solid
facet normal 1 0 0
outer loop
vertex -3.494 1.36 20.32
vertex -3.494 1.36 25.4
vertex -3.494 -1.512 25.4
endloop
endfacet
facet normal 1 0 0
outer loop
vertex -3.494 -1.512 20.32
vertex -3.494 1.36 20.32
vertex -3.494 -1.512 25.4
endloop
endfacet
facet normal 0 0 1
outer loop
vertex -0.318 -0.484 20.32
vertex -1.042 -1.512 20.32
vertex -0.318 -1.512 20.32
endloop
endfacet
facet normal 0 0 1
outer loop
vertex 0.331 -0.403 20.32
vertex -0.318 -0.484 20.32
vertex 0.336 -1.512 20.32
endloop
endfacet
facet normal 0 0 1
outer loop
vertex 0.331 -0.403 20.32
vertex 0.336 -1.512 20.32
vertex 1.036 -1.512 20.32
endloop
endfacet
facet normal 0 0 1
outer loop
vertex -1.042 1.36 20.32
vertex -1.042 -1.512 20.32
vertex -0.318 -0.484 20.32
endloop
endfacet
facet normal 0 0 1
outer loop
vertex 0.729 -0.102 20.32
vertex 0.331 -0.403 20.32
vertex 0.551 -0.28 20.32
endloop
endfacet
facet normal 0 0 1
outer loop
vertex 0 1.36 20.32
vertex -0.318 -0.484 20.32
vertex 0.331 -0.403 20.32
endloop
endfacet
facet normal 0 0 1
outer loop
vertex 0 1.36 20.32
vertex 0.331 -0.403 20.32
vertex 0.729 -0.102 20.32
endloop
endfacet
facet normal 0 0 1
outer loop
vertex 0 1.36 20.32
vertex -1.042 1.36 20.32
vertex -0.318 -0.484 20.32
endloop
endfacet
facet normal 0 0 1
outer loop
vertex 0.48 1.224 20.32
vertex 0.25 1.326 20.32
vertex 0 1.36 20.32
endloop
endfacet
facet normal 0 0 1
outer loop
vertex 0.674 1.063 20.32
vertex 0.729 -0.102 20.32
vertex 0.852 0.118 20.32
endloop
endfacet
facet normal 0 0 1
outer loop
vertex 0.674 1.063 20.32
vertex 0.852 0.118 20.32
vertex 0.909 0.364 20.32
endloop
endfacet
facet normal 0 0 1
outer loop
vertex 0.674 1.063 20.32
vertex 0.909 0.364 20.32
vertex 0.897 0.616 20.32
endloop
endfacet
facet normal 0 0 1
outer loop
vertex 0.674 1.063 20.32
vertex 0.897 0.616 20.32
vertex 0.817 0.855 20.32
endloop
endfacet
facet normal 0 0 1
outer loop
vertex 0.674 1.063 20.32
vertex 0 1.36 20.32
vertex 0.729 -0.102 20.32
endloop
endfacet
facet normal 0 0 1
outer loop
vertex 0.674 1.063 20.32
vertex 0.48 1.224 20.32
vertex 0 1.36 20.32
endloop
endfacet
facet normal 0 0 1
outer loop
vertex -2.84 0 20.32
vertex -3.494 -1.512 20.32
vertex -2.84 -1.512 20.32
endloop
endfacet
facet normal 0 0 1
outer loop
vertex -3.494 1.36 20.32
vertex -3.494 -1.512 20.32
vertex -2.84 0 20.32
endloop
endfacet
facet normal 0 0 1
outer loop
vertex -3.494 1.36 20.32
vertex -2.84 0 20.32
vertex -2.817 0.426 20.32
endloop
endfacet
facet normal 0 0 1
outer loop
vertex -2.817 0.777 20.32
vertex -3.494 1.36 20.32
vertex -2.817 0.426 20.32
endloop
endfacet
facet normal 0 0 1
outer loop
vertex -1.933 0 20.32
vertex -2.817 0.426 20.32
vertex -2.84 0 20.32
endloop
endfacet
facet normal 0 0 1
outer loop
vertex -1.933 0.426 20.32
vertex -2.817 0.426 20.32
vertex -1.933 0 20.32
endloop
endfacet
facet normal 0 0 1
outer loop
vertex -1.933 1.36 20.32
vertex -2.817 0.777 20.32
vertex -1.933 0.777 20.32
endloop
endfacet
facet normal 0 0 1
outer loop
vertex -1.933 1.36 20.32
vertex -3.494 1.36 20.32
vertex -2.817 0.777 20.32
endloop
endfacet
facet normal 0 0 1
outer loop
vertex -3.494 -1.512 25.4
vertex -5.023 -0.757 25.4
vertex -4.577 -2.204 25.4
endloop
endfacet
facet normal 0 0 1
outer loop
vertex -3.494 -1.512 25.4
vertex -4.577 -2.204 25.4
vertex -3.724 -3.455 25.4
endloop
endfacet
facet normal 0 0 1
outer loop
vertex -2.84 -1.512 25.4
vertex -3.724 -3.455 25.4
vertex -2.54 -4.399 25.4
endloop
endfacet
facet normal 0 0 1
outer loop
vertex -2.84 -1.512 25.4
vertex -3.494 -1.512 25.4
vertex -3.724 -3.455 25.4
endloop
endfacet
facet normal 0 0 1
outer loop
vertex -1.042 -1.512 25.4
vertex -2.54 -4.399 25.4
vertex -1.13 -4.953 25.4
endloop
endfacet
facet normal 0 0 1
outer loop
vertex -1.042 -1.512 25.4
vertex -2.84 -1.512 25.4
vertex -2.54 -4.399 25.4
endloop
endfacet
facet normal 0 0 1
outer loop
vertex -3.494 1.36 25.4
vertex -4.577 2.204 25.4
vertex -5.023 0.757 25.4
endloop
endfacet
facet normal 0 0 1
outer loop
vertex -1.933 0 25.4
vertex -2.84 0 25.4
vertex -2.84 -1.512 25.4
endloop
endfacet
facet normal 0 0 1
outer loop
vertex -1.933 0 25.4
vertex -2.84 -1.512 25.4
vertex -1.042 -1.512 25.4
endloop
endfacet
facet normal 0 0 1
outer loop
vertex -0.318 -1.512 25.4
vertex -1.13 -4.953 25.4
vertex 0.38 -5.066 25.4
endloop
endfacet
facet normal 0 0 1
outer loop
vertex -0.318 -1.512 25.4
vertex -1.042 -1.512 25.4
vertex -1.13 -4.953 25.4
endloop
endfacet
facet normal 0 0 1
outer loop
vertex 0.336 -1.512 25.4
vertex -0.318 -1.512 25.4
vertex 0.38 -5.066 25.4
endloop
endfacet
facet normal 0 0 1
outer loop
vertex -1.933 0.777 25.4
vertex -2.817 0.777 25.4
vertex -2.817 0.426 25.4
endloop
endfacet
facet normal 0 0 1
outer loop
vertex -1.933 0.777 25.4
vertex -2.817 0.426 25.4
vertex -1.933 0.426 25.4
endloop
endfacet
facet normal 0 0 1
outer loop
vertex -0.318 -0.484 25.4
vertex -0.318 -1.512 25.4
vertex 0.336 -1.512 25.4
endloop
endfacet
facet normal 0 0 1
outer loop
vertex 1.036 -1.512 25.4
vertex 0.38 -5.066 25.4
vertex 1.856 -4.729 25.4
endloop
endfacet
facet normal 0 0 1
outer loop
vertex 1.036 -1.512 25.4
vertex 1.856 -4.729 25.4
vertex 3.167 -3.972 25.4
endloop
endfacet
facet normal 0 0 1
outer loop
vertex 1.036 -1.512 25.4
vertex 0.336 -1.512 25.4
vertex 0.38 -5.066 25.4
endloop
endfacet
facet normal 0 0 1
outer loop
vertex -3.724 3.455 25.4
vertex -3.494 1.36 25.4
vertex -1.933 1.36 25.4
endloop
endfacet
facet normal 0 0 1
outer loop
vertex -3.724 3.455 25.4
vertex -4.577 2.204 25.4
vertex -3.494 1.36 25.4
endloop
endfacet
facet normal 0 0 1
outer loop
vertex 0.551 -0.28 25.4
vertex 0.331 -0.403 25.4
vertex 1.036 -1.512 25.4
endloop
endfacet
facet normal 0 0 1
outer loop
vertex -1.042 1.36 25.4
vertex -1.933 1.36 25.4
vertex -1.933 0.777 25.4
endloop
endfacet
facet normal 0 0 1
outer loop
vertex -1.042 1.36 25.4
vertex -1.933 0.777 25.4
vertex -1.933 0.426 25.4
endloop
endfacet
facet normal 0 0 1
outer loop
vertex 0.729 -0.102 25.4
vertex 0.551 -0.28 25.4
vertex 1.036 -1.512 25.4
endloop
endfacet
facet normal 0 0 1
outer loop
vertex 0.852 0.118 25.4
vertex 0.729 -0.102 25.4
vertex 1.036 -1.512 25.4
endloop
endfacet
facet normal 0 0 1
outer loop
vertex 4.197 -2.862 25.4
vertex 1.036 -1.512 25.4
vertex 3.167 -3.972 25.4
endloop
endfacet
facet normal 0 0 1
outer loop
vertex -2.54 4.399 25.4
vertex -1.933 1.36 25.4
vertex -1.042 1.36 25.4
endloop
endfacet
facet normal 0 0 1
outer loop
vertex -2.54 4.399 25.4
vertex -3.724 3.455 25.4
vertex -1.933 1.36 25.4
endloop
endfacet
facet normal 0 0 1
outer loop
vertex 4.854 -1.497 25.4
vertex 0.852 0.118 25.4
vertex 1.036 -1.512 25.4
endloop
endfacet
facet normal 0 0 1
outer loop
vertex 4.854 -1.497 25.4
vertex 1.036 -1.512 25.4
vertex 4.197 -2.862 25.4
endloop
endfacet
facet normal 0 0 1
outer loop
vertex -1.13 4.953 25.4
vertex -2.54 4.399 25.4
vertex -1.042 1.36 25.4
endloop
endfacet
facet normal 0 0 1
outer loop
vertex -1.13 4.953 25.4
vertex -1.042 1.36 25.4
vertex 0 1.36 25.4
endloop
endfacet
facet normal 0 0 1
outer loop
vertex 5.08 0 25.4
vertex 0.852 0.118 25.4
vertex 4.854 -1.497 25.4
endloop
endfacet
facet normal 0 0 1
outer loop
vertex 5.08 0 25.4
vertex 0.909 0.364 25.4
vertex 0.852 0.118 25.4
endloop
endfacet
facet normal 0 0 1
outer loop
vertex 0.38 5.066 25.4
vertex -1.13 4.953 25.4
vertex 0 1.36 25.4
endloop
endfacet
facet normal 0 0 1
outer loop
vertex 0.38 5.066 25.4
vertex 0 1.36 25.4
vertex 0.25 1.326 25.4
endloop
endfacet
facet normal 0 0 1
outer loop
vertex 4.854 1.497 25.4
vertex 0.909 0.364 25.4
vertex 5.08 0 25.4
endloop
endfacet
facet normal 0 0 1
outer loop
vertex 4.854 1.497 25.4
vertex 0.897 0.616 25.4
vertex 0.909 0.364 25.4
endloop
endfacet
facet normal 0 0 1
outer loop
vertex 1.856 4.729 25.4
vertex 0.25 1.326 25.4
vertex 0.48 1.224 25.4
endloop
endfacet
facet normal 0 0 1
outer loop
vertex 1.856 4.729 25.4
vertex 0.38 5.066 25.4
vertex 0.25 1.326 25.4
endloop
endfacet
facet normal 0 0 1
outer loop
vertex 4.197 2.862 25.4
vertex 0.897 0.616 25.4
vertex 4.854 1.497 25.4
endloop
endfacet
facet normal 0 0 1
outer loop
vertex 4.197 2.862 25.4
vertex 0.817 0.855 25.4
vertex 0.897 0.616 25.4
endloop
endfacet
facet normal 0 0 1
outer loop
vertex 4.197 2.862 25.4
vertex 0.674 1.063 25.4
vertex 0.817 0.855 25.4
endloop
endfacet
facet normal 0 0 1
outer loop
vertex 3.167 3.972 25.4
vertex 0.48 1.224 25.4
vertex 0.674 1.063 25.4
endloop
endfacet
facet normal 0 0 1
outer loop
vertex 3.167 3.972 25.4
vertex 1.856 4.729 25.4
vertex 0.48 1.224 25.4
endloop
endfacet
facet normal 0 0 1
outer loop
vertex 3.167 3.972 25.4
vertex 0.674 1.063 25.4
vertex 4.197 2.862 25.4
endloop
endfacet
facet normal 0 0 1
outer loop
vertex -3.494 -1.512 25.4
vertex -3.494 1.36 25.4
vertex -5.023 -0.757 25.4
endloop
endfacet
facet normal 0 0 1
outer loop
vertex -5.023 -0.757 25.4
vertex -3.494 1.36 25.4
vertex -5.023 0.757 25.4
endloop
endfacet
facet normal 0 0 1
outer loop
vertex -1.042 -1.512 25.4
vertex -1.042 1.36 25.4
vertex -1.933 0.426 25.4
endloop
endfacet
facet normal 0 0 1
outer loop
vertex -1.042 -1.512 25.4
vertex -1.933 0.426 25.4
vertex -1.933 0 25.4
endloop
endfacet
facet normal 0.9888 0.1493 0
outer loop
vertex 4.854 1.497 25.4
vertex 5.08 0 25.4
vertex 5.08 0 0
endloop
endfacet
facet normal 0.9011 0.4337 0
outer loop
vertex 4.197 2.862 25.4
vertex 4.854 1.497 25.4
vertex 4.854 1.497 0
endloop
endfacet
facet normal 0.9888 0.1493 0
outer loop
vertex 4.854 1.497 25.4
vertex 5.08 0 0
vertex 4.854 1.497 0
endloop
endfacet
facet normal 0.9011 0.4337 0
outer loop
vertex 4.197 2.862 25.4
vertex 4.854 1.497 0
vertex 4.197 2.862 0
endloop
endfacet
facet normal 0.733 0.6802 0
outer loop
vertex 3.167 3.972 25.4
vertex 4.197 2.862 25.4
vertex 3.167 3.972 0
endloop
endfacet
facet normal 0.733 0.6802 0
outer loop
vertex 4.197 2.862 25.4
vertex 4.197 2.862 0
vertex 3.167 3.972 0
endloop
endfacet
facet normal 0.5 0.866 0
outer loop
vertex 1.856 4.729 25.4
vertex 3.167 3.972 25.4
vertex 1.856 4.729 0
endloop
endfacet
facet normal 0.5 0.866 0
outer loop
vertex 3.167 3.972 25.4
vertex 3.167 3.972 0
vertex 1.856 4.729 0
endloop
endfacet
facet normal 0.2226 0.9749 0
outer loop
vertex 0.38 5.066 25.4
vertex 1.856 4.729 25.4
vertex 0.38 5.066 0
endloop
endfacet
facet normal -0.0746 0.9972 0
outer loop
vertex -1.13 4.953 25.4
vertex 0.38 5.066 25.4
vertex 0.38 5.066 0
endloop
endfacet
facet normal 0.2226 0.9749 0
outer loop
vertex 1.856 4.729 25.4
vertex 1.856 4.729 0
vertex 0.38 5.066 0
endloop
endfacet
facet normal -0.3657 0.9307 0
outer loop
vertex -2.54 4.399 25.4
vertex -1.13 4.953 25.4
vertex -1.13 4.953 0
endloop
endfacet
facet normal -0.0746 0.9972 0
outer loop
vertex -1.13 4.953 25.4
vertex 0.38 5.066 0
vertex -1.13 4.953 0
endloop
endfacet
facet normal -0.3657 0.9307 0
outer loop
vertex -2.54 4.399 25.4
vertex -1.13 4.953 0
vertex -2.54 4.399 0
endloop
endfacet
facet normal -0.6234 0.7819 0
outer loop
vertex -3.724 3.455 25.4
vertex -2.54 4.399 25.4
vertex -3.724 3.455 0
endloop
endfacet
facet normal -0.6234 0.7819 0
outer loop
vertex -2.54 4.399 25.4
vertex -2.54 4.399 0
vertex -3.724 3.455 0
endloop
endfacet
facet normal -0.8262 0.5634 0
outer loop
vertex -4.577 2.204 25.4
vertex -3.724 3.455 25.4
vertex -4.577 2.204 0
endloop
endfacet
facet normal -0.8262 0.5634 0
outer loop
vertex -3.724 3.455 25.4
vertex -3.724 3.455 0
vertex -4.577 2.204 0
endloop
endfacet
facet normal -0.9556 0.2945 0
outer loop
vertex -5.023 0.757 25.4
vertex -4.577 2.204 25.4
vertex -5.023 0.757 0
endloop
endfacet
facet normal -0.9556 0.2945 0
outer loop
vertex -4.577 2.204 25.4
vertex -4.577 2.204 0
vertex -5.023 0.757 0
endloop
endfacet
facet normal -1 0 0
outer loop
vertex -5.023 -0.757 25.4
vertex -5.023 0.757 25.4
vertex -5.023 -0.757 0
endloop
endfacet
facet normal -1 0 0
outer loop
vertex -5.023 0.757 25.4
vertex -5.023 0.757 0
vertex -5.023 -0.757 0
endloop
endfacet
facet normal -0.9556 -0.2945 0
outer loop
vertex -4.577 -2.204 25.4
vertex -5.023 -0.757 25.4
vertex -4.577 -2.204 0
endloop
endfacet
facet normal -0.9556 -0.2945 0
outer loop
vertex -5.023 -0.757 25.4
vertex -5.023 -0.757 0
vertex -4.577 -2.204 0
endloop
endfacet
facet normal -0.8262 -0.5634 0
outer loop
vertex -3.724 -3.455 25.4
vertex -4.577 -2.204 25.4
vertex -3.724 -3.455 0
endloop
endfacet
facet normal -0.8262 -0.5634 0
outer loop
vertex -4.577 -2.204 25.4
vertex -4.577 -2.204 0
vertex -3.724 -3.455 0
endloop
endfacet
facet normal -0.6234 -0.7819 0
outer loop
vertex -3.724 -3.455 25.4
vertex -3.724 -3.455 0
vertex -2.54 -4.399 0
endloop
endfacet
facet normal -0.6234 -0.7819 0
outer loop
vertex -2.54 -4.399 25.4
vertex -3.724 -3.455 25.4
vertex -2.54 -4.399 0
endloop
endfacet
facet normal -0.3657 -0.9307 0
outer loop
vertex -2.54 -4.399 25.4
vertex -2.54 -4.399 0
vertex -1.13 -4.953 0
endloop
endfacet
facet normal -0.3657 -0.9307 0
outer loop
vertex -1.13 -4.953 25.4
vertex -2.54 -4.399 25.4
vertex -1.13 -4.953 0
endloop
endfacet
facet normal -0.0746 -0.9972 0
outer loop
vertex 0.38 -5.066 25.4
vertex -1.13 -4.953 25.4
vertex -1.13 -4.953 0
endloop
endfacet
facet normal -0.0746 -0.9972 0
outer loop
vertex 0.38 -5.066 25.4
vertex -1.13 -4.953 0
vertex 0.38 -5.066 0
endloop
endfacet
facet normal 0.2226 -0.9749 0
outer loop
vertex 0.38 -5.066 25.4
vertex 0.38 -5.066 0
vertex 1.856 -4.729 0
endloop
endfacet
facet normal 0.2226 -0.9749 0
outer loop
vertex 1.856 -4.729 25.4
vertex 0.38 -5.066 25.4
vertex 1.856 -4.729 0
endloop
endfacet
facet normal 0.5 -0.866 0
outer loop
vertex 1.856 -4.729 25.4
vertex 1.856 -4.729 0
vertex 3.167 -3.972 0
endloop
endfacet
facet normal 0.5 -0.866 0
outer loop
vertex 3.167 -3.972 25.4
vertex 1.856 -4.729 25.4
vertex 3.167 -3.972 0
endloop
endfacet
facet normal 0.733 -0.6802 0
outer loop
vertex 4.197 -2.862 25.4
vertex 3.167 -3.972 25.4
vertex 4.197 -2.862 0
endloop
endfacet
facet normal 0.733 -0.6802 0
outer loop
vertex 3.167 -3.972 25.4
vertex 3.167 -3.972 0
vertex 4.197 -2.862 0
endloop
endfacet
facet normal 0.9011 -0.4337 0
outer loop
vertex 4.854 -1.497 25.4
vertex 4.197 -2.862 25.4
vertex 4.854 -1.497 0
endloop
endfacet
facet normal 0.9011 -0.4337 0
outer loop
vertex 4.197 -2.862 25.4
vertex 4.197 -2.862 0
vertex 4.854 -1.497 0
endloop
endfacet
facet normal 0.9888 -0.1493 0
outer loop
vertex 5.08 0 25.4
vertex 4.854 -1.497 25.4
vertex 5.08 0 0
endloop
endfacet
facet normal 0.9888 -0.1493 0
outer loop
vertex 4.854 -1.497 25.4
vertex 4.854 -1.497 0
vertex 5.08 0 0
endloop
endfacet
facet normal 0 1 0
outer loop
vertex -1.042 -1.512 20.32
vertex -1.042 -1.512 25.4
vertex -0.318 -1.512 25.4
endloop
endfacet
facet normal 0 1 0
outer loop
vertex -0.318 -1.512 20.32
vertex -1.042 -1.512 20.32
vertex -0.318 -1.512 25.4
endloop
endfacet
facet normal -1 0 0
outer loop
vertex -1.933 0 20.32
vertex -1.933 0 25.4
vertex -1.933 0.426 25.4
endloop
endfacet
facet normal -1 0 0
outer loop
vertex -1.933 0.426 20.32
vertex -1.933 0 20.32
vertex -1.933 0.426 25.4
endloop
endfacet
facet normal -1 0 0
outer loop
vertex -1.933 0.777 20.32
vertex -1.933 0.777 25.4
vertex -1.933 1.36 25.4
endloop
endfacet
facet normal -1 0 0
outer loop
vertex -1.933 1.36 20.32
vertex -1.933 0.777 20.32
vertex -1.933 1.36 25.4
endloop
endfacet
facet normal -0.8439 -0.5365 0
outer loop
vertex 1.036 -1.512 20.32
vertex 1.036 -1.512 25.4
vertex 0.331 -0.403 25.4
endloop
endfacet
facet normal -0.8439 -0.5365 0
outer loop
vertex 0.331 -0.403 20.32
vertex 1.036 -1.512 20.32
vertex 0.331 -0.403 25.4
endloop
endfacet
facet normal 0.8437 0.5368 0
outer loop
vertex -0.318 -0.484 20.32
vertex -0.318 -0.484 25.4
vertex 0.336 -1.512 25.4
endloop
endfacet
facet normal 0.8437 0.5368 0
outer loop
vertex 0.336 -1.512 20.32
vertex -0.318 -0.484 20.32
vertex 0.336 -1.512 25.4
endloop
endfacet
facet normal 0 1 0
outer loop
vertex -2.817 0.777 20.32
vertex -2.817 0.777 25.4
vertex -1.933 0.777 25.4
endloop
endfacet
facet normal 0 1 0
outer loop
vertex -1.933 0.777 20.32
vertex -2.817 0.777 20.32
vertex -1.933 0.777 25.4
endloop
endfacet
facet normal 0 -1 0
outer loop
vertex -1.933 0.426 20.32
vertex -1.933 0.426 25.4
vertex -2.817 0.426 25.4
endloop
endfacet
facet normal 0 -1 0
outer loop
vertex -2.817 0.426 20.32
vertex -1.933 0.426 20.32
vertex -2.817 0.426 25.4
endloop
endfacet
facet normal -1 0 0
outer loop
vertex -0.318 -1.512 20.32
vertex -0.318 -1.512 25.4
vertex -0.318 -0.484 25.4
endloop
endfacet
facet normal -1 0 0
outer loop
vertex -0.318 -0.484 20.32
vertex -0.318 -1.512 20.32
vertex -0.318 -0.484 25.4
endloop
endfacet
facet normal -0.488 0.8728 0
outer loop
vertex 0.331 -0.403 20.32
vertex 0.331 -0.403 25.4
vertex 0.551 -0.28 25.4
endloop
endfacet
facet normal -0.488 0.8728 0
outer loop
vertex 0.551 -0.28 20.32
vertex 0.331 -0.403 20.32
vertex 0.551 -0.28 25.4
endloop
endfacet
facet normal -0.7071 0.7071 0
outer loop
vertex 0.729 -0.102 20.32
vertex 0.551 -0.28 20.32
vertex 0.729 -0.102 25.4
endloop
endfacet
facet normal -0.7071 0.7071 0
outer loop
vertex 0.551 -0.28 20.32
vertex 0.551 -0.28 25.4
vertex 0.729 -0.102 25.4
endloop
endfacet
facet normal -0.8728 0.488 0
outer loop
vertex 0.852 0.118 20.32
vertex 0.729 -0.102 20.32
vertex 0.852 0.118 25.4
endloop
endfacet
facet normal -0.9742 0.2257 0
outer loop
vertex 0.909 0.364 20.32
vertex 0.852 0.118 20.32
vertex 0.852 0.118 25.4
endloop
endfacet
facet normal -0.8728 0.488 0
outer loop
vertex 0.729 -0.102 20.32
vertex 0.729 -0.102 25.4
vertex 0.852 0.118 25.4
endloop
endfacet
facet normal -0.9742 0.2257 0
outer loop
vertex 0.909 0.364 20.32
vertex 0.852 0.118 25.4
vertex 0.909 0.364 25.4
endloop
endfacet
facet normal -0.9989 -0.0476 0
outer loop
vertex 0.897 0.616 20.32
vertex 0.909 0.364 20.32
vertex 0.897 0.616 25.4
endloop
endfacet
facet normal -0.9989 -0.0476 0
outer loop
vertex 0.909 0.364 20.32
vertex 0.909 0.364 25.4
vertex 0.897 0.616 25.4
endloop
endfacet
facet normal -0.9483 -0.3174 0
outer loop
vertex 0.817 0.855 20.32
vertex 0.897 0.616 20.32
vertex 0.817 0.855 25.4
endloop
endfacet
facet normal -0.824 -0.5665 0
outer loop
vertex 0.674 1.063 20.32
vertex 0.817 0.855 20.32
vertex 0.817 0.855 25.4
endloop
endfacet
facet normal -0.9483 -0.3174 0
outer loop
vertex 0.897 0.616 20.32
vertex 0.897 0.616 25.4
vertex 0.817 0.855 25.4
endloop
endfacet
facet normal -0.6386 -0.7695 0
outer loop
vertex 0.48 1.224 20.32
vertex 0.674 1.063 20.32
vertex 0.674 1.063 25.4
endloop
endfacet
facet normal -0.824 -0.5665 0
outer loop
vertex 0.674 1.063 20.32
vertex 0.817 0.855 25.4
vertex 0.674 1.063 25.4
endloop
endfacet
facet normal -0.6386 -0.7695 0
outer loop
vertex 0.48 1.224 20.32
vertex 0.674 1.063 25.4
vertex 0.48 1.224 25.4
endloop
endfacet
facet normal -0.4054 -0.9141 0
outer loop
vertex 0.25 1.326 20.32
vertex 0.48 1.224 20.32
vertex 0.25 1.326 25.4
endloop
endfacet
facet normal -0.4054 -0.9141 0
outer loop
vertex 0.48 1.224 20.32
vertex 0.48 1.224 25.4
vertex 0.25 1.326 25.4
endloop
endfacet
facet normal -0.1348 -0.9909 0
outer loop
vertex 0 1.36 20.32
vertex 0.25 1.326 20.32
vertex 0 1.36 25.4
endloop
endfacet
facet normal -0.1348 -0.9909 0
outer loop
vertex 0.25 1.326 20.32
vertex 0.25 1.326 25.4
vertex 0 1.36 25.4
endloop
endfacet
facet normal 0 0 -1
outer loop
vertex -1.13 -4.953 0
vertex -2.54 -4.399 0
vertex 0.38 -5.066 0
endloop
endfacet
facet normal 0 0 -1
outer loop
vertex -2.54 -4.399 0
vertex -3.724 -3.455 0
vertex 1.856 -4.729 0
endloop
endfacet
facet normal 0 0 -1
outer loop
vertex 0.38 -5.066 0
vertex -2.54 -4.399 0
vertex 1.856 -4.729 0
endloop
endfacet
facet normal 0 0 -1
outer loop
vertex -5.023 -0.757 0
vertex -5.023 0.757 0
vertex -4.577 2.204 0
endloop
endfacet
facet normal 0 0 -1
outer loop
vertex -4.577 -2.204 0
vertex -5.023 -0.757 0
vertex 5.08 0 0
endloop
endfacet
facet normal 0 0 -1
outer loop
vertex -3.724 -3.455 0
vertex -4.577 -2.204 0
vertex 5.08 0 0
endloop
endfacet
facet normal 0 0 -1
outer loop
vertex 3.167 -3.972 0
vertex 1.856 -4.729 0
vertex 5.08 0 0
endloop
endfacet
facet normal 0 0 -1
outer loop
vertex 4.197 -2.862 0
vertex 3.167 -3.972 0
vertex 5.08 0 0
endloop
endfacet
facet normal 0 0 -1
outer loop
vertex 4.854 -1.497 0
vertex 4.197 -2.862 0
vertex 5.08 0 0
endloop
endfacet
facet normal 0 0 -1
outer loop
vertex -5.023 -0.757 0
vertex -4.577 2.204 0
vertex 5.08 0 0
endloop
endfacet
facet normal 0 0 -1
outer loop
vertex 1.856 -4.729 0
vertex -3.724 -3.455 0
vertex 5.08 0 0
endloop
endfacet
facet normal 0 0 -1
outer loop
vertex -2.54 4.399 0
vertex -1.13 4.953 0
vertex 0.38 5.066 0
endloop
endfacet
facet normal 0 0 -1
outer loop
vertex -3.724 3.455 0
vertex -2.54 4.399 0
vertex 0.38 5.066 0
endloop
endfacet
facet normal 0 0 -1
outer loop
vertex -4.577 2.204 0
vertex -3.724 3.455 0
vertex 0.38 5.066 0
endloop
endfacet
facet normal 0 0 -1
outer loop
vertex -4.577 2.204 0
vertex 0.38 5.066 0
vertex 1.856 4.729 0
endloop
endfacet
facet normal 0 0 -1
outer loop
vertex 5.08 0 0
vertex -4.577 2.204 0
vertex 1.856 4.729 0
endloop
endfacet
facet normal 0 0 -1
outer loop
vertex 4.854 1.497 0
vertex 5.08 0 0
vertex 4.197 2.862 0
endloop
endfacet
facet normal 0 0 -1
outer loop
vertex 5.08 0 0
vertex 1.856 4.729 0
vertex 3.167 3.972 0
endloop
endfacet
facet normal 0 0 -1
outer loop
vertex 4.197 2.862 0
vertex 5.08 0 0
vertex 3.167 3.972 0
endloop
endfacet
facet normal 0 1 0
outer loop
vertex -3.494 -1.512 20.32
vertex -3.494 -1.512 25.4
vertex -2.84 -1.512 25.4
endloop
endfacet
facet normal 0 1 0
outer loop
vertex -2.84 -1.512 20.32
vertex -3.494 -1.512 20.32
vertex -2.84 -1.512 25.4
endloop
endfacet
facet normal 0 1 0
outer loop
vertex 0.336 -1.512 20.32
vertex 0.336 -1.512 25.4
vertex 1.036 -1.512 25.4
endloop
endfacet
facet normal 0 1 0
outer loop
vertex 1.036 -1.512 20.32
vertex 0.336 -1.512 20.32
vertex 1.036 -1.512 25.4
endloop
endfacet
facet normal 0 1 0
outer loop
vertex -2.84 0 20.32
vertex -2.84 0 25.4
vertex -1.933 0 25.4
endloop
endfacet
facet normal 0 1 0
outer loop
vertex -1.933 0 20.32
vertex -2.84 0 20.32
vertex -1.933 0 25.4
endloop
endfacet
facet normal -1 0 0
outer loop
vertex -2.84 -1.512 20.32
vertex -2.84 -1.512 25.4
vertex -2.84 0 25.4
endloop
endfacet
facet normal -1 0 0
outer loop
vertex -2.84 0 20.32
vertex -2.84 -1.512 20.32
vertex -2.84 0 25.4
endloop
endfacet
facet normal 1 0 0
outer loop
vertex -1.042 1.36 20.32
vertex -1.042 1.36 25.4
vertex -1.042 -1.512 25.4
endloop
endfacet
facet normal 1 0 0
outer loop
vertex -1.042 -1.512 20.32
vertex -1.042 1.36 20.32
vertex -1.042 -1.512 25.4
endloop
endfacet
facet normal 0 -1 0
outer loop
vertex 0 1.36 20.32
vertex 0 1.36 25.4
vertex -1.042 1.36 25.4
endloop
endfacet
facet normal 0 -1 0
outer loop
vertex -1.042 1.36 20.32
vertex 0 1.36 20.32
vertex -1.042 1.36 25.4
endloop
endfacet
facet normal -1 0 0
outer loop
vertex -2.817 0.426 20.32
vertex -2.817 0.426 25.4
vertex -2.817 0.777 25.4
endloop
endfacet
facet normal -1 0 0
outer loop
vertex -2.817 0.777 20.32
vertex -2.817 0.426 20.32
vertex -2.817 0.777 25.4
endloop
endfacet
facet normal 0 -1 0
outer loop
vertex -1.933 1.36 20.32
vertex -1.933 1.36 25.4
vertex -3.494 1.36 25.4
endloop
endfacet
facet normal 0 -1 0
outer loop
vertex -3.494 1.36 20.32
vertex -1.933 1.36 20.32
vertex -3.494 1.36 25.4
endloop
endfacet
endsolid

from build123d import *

# Parameters (mm, degrees)
F0_R     = 5.08
F1_DEPTH = 25.4
F3_DEPTH = 5.08


with BuildPart() as f1:
    # F0 (on Top) → F1 (new body)
    with BuildSketch(Plane.XY):
        Circle(F0_R)
    extrude(amount=F1_DEPTH)

    # F2 (on face) → F3 (cut)
    with BuildSketch(Plane.XY.offset(25.4)):
        Polygon((-3.493968, 1.360344), (-3.493968, -1.511888), (-2.840127, -1.511888), (-2.840127, 0), (-1.933453, 0), (-1.933453, 0.426284), (-2.816775, 0.426284), (-2.816775, 0.776557), (-1.933453, 0.776557), (-1.933453, 1.360344), align=None)
        with BuildLine():
            Line((0, 1.360344), (-1.042063, 1.360344))
            Line((-1.042063, 1.360344), (-1.042063, -1.511888))
            Line((-1.042063, -1.511888), (-0.318167, -1.511888))
            Line((-0.318167, -1.511888), (-0.318167, -0.484423))
            Line((-0.318167, -0.484423), (0.335674, -1.511888))
            Line((0.335674, -1.511888), (1.036218, -1.511888))
            Line((1.036218, -1.511888), (0.330819, -0.403403))
            ThreePointArc((0.330819, -0.403403), (0.897252, 0.615739), (0, 1.360344))
        make_face()
    extrude(amount=-F3_DEPTH, mode=Mode.SUBTRACT)


solid = f1.part
